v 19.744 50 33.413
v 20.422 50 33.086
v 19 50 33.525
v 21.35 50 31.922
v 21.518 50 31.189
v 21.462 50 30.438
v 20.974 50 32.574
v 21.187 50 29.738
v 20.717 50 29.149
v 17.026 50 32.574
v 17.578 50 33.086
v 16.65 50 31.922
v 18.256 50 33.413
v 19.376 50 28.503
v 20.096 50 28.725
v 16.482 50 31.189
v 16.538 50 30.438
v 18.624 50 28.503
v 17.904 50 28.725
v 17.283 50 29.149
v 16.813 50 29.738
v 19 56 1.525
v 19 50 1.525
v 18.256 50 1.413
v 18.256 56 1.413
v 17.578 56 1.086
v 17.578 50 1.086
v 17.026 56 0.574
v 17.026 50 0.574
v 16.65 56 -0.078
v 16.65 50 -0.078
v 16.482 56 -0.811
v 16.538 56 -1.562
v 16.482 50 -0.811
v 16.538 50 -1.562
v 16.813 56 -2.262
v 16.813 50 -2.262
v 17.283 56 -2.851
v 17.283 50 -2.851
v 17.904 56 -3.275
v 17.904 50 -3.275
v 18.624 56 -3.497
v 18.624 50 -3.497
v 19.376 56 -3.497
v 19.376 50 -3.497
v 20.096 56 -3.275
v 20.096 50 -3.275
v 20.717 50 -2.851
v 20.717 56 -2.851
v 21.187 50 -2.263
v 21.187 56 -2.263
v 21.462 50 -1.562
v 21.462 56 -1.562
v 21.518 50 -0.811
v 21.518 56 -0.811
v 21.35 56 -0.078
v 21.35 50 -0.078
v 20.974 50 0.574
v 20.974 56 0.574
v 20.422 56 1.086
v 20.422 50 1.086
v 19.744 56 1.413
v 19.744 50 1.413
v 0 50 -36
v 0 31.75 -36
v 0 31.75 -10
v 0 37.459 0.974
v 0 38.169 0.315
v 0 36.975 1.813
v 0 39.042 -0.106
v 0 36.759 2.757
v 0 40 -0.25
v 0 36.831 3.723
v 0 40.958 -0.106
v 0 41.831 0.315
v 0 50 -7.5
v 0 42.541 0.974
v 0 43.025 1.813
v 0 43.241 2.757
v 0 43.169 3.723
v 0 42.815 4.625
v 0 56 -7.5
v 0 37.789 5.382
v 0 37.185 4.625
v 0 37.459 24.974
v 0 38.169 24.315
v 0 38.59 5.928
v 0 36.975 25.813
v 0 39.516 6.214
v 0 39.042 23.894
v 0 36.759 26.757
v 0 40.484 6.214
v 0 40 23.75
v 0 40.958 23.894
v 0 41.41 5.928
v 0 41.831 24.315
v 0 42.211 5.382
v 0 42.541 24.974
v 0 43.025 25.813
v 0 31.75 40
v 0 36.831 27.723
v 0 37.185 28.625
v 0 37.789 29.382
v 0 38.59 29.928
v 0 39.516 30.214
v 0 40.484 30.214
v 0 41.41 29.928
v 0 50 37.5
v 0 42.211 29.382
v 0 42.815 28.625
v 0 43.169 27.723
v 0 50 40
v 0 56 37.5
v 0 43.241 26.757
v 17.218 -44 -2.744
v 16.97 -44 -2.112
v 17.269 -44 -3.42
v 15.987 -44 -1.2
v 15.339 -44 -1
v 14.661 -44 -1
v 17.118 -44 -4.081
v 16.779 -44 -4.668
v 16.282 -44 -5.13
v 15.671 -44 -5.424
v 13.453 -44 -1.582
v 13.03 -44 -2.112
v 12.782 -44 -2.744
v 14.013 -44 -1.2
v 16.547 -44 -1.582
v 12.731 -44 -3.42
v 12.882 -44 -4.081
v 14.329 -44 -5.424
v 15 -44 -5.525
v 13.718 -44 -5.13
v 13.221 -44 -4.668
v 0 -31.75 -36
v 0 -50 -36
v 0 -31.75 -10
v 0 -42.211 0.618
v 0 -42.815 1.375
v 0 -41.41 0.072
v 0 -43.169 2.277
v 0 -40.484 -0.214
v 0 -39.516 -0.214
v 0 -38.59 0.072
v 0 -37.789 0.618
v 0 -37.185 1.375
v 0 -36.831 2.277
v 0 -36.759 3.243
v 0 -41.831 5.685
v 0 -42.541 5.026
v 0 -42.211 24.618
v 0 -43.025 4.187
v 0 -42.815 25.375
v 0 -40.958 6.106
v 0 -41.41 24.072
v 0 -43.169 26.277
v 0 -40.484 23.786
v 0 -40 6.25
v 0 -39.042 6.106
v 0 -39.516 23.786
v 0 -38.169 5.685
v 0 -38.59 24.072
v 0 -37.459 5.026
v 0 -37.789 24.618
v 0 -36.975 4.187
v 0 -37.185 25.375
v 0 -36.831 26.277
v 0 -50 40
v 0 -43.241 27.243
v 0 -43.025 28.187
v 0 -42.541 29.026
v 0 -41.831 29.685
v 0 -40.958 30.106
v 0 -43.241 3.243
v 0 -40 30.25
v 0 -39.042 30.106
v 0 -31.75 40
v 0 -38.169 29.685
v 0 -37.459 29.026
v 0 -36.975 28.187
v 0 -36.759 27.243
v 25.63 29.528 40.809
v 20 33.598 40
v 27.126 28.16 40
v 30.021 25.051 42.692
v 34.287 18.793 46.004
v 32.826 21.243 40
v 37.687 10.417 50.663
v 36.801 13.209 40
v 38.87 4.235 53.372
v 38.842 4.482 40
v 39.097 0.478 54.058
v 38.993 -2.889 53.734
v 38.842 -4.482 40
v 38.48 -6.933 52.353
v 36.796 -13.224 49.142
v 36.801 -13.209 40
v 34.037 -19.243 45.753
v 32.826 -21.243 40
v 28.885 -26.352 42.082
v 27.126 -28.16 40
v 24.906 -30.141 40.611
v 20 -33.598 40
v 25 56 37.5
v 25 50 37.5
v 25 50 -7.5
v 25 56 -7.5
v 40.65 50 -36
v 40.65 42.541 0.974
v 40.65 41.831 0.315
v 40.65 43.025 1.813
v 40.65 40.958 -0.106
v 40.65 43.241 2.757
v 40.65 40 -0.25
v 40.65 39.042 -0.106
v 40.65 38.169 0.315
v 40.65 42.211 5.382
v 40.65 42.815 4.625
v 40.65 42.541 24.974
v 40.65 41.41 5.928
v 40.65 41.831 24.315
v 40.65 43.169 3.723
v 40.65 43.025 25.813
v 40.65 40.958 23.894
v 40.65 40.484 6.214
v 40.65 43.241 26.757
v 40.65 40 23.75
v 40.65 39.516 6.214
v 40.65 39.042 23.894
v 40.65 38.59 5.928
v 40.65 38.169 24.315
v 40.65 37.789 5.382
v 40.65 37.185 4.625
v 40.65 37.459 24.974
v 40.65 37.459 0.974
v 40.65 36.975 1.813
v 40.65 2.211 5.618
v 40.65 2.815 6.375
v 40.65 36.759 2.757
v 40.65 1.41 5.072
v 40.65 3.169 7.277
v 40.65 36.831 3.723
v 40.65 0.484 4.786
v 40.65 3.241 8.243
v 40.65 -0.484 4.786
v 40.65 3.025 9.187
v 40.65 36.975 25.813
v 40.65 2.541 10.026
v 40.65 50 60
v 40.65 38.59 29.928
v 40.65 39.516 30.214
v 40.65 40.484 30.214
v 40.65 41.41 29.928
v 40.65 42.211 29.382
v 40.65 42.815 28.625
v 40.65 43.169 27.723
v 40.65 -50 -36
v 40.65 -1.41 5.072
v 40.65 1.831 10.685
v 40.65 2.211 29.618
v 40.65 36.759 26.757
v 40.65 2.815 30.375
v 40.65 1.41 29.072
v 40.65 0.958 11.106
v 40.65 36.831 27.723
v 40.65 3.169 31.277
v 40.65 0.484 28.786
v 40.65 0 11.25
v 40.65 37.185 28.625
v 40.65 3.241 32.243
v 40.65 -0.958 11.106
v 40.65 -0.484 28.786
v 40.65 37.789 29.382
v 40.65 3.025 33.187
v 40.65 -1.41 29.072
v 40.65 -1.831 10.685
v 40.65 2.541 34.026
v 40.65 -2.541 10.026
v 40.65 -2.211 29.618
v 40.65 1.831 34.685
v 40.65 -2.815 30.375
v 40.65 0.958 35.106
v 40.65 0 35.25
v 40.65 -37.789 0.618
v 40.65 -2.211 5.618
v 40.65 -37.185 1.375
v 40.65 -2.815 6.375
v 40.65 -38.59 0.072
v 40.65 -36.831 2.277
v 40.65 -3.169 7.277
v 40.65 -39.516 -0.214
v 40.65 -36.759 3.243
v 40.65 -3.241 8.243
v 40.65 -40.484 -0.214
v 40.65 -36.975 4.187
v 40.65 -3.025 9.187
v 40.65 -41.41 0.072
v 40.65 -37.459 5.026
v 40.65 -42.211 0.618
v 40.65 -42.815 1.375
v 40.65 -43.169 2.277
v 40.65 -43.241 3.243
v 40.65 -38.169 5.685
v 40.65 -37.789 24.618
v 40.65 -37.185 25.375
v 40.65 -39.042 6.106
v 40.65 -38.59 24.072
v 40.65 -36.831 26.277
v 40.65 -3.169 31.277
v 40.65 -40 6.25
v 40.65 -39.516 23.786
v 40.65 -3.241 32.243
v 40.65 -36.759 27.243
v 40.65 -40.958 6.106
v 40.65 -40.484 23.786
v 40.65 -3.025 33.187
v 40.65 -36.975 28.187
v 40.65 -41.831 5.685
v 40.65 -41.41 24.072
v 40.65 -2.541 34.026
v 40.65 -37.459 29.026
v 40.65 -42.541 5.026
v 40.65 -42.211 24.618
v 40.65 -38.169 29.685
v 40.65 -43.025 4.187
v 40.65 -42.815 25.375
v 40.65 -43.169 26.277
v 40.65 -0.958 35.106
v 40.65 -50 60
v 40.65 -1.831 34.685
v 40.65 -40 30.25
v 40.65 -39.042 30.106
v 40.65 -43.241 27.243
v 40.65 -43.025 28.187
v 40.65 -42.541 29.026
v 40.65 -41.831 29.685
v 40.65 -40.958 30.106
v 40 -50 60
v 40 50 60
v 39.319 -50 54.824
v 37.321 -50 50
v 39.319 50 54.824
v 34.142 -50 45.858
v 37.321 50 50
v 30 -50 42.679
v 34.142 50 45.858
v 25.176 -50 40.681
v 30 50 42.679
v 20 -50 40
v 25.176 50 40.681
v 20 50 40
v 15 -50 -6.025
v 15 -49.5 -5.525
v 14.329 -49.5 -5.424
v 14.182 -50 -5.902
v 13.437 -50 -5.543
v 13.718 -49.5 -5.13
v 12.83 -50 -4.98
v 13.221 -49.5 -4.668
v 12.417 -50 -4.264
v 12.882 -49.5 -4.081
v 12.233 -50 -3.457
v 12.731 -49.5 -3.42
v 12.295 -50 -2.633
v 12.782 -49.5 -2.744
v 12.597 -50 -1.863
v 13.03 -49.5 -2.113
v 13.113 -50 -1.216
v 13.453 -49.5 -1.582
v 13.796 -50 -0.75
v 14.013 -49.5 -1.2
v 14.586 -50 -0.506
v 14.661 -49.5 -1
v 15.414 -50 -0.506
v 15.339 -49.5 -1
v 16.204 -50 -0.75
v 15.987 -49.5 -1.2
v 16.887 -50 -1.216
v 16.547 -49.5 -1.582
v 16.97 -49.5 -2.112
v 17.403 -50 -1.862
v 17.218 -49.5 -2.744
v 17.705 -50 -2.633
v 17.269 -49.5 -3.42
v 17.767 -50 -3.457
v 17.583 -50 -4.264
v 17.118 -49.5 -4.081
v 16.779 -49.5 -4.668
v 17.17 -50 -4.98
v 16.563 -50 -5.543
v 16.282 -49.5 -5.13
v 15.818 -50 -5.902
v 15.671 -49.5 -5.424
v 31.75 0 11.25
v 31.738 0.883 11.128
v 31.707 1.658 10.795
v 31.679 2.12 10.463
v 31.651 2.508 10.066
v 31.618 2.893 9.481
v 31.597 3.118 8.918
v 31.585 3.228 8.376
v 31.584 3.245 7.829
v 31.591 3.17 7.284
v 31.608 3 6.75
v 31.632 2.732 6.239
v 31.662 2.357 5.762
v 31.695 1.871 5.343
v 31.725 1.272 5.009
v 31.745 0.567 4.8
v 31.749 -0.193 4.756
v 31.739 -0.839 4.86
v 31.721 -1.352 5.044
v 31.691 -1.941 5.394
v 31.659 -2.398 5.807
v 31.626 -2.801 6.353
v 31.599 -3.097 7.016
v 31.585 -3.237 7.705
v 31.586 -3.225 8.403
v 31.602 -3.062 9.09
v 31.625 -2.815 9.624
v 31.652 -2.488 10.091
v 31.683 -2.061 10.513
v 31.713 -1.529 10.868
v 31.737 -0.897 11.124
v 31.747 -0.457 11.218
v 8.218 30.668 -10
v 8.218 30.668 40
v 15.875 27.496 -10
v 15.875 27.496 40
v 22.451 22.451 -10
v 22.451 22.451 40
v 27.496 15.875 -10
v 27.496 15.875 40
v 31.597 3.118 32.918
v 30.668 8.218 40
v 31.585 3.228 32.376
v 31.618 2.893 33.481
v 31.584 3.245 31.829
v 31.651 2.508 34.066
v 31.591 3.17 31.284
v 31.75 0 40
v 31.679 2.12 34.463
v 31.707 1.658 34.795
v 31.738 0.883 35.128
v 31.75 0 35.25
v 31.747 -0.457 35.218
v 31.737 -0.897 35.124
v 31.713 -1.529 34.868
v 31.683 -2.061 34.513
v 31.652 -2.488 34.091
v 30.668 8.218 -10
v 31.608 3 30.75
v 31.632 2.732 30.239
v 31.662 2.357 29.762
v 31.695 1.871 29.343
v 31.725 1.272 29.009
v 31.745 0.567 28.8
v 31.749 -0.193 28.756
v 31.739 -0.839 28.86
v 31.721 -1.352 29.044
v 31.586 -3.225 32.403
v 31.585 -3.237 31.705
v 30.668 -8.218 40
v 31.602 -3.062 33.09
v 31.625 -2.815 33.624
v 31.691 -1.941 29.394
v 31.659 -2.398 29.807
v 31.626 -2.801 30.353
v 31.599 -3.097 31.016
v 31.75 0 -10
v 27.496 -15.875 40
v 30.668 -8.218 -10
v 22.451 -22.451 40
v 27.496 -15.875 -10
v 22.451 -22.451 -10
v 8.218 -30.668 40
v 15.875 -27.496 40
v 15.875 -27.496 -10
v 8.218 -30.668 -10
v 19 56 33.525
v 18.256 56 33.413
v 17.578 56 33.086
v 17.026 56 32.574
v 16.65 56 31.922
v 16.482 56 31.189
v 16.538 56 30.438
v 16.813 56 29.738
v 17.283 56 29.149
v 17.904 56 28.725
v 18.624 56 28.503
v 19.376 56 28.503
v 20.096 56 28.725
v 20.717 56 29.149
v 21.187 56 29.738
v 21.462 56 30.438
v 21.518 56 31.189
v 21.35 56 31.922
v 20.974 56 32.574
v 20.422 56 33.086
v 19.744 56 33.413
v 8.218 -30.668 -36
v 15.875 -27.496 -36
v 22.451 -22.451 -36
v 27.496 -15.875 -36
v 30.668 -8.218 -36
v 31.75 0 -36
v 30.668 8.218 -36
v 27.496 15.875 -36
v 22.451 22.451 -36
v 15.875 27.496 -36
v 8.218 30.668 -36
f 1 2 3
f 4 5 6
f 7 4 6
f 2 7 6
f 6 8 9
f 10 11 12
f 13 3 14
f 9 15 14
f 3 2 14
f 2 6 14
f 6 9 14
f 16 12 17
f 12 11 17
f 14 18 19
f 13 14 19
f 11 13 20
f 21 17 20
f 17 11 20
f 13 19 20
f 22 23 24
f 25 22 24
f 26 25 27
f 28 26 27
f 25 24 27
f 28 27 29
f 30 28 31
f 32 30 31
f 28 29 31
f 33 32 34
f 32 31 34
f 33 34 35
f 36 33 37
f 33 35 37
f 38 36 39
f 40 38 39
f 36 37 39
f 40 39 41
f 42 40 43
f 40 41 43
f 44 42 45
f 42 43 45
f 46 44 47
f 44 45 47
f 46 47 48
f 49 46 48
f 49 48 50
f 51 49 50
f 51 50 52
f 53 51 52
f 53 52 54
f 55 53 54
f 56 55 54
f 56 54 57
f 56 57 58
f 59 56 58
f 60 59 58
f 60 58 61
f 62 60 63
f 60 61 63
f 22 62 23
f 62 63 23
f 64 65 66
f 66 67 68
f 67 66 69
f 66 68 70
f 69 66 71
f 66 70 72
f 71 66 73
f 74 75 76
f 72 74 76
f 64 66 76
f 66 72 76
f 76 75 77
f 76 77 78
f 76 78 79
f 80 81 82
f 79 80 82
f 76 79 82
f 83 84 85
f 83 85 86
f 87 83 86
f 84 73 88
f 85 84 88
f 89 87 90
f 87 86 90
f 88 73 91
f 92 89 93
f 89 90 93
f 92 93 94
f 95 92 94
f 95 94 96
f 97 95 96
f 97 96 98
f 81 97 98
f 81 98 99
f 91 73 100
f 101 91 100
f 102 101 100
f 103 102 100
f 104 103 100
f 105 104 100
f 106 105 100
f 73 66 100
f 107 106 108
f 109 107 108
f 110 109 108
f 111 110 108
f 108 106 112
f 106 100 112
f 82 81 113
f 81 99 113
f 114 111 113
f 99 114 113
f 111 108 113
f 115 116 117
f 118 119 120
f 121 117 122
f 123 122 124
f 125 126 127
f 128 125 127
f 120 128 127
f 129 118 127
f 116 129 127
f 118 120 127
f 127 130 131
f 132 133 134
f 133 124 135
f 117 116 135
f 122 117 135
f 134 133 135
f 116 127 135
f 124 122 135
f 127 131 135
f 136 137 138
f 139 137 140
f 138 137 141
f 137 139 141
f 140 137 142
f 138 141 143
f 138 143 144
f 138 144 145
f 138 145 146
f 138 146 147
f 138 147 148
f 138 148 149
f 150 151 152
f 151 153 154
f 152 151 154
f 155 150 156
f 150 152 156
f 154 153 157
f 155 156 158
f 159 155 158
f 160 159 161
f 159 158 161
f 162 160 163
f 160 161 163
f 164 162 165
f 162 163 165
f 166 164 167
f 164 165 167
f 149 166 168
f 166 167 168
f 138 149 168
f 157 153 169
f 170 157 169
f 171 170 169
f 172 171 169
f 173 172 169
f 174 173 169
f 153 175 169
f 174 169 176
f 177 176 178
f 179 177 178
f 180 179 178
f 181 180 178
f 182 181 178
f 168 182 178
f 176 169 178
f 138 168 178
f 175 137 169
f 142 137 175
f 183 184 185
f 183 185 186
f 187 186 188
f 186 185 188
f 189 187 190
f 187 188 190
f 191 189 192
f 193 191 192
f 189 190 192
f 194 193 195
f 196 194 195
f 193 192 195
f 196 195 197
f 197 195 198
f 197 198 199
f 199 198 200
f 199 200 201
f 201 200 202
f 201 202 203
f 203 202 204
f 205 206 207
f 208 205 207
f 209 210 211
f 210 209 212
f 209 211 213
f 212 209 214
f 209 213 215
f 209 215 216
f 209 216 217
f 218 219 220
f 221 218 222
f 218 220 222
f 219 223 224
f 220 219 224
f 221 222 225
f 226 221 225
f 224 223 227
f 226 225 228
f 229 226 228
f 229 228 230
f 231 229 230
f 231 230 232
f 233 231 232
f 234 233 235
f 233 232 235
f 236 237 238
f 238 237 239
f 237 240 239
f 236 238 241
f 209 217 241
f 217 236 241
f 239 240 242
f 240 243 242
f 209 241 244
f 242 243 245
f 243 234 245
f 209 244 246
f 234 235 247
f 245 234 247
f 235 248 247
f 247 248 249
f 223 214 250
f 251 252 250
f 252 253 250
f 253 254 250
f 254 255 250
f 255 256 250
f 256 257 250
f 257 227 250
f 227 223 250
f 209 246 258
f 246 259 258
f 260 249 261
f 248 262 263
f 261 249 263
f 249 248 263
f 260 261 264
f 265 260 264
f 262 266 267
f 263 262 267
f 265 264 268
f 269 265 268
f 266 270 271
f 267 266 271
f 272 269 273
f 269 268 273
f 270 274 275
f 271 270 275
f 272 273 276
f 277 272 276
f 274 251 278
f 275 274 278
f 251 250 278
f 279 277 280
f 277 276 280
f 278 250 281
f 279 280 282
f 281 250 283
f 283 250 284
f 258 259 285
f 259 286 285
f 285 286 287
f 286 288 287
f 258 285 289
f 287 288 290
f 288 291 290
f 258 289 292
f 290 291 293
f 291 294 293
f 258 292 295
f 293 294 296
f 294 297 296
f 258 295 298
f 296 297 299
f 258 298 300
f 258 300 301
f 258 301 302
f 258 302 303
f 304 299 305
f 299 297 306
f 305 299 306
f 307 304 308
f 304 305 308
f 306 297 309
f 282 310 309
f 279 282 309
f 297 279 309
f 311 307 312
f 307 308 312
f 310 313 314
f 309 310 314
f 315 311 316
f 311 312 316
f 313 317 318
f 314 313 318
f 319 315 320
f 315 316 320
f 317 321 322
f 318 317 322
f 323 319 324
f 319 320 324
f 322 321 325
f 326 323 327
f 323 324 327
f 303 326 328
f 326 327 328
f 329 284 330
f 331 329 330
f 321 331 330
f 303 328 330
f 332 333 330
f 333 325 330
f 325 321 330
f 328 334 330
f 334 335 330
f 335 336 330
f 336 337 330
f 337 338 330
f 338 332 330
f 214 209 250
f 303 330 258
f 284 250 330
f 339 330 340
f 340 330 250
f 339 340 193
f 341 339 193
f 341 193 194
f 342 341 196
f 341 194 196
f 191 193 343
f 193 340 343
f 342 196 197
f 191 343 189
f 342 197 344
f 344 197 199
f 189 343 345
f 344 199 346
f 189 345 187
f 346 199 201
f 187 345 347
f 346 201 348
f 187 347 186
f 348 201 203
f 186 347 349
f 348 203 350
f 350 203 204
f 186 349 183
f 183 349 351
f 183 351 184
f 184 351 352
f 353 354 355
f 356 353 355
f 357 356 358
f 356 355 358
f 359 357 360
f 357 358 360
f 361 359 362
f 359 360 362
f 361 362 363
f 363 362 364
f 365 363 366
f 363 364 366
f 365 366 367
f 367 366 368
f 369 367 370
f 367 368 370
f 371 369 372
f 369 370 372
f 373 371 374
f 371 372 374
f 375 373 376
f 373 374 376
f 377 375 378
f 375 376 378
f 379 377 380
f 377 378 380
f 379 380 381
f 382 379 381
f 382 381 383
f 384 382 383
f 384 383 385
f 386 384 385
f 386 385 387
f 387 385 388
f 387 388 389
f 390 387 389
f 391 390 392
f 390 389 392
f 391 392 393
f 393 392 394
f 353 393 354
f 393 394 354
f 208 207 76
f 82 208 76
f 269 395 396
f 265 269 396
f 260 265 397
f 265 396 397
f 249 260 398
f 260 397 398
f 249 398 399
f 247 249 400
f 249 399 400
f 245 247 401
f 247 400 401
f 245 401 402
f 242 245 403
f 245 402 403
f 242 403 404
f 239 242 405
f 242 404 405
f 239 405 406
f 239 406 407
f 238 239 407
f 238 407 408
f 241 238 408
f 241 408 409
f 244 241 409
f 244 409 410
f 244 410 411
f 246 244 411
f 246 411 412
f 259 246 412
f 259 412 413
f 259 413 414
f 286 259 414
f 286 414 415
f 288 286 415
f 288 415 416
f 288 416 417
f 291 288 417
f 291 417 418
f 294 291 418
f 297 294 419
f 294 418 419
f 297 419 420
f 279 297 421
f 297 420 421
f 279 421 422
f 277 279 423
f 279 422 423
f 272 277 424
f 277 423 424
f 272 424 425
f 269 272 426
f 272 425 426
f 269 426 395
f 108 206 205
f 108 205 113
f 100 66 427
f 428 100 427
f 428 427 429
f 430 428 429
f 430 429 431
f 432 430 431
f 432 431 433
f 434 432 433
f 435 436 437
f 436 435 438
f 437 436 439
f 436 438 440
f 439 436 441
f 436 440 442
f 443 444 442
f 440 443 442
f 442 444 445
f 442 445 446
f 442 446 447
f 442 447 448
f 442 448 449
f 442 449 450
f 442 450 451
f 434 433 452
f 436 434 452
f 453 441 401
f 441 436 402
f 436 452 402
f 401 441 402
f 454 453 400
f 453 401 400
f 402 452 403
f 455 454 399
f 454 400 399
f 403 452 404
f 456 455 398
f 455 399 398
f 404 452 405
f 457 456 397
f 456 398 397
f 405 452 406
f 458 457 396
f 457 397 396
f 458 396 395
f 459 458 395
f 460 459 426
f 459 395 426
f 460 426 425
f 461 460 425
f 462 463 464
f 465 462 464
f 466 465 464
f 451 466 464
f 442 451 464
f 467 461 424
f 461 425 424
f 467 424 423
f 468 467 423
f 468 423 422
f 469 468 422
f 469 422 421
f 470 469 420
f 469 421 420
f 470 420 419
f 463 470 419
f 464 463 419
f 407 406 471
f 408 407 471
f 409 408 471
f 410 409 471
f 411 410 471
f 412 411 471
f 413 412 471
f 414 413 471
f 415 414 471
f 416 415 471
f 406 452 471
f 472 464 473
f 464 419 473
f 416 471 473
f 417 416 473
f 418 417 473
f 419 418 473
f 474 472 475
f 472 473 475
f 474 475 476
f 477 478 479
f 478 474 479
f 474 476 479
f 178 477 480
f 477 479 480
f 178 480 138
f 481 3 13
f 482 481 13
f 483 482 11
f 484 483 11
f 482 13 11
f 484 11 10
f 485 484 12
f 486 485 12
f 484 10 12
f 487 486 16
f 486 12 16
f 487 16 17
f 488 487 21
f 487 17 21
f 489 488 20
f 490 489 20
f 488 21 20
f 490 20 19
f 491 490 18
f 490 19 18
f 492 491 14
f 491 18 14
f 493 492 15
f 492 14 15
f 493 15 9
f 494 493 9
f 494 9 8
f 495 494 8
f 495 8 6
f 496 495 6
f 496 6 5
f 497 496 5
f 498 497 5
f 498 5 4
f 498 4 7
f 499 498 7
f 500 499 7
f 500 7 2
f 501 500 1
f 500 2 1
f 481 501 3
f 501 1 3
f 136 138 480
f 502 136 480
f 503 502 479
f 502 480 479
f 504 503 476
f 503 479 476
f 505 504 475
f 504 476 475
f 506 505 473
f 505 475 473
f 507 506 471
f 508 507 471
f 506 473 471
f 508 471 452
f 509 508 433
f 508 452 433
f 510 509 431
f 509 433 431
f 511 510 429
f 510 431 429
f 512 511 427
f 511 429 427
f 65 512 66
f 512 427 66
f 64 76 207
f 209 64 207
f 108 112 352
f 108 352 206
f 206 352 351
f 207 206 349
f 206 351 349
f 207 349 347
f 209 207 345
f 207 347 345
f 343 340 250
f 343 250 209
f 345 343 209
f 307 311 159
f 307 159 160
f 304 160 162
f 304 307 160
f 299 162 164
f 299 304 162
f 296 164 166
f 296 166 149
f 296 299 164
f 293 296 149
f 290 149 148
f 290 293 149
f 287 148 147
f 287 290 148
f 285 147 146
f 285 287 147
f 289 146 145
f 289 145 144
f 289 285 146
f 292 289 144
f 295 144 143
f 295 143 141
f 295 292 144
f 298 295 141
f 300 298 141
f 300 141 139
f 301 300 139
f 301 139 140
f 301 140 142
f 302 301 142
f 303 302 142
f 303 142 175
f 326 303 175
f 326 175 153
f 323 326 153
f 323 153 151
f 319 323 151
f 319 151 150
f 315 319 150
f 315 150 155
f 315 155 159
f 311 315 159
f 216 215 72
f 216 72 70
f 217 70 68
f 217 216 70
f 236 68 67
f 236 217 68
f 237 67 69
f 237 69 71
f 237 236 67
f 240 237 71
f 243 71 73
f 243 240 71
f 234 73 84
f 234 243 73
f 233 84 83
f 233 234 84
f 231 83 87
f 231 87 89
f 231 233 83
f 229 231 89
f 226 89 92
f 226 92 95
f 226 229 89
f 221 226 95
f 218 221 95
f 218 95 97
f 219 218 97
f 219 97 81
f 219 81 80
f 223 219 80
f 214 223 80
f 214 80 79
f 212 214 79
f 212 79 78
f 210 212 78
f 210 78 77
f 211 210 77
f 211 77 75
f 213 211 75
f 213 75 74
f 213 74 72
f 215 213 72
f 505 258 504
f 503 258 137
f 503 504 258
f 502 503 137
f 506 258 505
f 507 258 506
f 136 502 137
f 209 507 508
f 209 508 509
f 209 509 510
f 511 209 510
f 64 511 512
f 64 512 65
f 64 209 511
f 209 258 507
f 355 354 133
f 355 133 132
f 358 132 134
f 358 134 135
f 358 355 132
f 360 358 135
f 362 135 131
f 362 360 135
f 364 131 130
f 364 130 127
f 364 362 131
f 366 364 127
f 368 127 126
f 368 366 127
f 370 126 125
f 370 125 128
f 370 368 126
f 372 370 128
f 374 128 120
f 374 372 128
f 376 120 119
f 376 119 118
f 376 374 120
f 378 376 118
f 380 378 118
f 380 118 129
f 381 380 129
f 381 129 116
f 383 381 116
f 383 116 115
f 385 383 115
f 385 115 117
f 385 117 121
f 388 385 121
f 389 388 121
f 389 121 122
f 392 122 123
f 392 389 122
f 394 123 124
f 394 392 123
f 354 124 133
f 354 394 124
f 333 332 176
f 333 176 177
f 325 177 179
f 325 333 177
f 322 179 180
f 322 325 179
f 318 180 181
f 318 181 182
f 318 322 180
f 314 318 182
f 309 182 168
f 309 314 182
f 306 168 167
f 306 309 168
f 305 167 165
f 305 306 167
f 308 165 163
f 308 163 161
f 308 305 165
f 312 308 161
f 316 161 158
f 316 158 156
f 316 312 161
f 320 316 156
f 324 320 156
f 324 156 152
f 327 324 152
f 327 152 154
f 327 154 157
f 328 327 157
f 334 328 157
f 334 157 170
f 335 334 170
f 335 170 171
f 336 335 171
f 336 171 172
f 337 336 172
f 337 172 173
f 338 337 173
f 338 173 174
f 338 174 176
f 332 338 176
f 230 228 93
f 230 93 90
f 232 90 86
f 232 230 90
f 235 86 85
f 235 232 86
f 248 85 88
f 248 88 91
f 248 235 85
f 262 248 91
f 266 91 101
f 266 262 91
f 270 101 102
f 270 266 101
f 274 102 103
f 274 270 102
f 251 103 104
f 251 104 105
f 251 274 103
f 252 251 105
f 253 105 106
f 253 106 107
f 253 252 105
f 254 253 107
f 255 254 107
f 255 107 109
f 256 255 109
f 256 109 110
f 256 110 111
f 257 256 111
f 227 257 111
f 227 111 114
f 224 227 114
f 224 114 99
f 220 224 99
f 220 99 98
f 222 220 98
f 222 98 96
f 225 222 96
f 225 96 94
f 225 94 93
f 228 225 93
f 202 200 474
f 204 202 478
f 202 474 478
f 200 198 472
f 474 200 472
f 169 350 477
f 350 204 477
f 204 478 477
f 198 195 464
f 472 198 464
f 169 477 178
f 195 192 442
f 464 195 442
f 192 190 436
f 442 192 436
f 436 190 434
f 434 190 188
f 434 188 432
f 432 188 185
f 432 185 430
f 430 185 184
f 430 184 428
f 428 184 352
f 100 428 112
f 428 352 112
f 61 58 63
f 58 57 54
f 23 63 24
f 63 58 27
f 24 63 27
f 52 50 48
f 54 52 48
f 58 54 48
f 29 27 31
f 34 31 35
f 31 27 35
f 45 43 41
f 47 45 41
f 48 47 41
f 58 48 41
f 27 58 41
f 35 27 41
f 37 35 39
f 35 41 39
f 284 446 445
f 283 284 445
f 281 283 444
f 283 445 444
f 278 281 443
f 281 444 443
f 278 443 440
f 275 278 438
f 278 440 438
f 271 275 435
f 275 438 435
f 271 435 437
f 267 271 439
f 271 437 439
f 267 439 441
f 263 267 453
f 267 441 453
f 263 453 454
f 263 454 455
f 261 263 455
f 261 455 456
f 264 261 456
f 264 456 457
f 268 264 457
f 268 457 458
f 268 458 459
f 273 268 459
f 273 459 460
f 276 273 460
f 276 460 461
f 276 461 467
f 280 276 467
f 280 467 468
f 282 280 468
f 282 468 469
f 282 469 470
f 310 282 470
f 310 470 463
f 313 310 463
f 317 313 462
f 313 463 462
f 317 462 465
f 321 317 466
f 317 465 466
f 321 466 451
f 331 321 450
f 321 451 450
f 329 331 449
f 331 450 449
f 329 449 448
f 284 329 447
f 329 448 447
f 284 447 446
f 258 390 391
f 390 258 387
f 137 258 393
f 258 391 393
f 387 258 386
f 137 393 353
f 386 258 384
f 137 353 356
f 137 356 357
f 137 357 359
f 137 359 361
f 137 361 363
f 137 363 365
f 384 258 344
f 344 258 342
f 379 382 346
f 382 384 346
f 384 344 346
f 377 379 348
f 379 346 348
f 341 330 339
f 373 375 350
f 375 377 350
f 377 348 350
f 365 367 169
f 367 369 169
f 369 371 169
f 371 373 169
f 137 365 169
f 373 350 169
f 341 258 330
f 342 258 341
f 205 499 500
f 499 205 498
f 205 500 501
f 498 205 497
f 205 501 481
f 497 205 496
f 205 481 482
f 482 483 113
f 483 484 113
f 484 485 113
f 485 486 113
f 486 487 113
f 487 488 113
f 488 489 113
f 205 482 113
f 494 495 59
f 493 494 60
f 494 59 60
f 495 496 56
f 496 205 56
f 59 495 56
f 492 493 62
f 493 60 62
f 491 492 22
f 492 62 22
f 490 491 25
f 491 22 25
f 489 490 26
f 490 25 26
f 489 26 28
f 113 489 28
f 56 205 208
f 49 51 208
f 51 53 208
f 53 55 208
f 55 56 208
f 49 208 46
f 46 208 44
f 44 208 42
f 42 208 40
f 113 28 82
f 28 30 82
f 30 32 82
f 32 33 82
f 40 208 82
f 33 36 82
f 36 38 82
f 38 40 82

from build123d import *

# Parameters (mm, degrees)
CENTRE_HOLE_FOR_L2_DEPTH      = 40
CENTRE_HOLE_FOR_L2_DEPTH_BACK = 10
SKETCH1_R                     = 39.1
SKETCH1_R_2                   = 31.75
MAIN_STRUCTURE_DEPTH          = 60
MAIN_STRUCTURE_DEPTH_BACK     = 50
SKETCH2_W                     = 100
SKETCH2_H                     = 100
SKETCH2_R                     = 39.1
BEARING_CURVE_DEPTH           = 10
SKETCH6_R                     = 10.5
SHAFT_HOLE_DEPTH              = 10
WRIST_CUTOUT_DEPTH            = 188.082869339
SKETCH11_W                    = 25
SKETCH11_H                    = 45
SKETCH11_R                    = 2.525
BOSS_EXTRUDE1_DEPTH           = 6
CUT_EXTRUDE6_DEPTH            = 168.73789077
CUT_EXTRUDE6_DEPTH_BACK       = 168.73789077
SKETCH18_R                    = 3.25
CUT_EXTRUDE7_START            = -1.5875
CUT_EXTRUDE7_DEPTH            = 1.5875
SKETCH9_R                     = 12.05
BEARING_DEPTH                 = 5
CUT_EXTRUDE8_DEPTH            = 3
SKETCH21_R                    = 3.25
SKETCH21_R_2                  = 1.65
CUT_EXTRUDE9_DEPTH            = 167.868211501
CUT_EXTRUDE10_DEPTH           = 6.35
SKETCH23_R                    = 2.275
CUT_EXTRUDE11_DEPTH           = 6
CHAMFER1_SIZE                 = 0.5
BOSS_EXTRUDE2_DEPTH           = 26


with BuildPart() as part:
    # Sketch1 → Centre Hole for L2 (new, two sides: drawn at the far end of the back side and taken through both)
    with BuildSketch(Plane.XY.offset(-CENTRE_HOLE_FOR_L2_DEPTH_BACK)):
        Circle(SKETCH1_R)
        Circle(SKETCH1_R_2, mode=Mode.SUBTRACT)
    extrude(amount=CENTRE_HOLE_FOR_L2_DEPTH + CENTRE_HOLE_FOR_L2_DEPTH_BACK)

    # Sketch2 → Main Structure (add, two sides: drawn at the far end of the back side and taken through both)
    with BuildSketch(Plane.XY.offset(40).offset(-MAIN_STRUCTURE_DEPTH_BACK)):
        Rectangle(SKETCH2_W, SKETCH2_H)
        Circle(SKETCH2_R, mode=Mode.SUBTRACT)
    extrude(amount=MAIN_STRUCTURE_DEPTH + MAIN_STRUCTURE_DEPTH_BACK)

    # Sketch3 → Bearing Curve (add)
    with BuildSketch(Plane.ZY.offset(50)):
        with BuildLine():
            Line((100, 50), (100, -50))
            ThreePointArc((100, -50), (150, 0), (100, 50))
        make_face()
    bearing_curve = extrude(amount=-BEARING_CURVE_DEPTH)

    # Upright Mirror: Bearing Curve across plane
    add(bearing_curve.mirror(Plane(origin=(0, 0, 0), x_dir=(0, 0, 1), z_dir=(1, 0, 0))))

    # Sketch6 → Shaft Hole (cut)
    with BuildSketch(Plane.ZY.offset(50)):
        with Locations((100, 0)):
            Circle(SKETCH6_R)
    extrude(amount=-SHAFT_HOLE_DEPTH, mode=Mode.SUBTRACT)

    # Sketch4 → Wrist Cutout (cut, through all)
    with BuildSketch(Plane(origin=(0, 50, 0), x_dir=(1, 0, 0), z_dir=(0, 1, 0))):
        with BuildLine():
            Line((-40, -100), (-40, -60))
            ThreePointArc((-40, -60), (-34.142135624, -45.857864376), (-20, -40))
            Line((-20, -40), (20, -40))
            ThreePointArc((20, -40), (34.142135624, -45.857864376), (40, -60))
            Line((40, -60), (40, -100))
            Line((40, -100), (-40, -100))
        make_face()
    extrude(amount=-WRIST_CUTOUT_DEPTH, mode=Mode.SUBTRACT)

    # SurfaceCut1
    split(bisect_by=Plane.ZY, keep=Keep.TOP)

    # Sketch11 → Boss-Extrude1 (add)
    with BuildSketch(Plane(origin=(0, 50, 0), x_dir=(1, 0, 0), z_dir=(0, 1, 0))):
        with Locations((-12.5, -15)):
            Rectangle(SKETCH11_W, SKETCH11_H)
        with Locations(Location((-19, 1, 0), (0, 0, 270))):
            Circle(SKETCH11_R, mode=Mode.SUBTRACT)
        with Locations(Location((-19, -31, 0), (0, 0, 270))):
            Circle(SKETCH11_R, mode=Mode.SUBTRACT)
    extrude(amount=BOSS_EXTRUDE1_DEPTH)

    # Sketch18 → Cut-Extrude6 (cut, two sides: drawn at the far end of the back side and taken through both)
    with BuildSketch(Plane.ZY.offset(50).offset(-CUT_EXTRUDE6_DEPTH_BACK)):
        with Locations((8, 0)):
            Circle(SKETCH18_R)
        with Locations((32, 0)):
            Circle(SKETCH18_R)
    extrude(amount=CUT_EXTRUDE6_DEPTH + CUT_EXTRUDE6_DEPTH_BACK, mode=Mode.SUBTRACT)

    # Sketch19 → Cut-Extrude7 (cut)
    with BuildSketch(Plane(origin=(-40, 0, 0), x_dir=(0, 0, -1), z_dir=(1, 0, 0)).offset(CUT_EXTRUDE7_START)):
        with BuildLine():
            Line((-60, 50), (-100, 50))
            ThreePointArc((-100, 50), (-150, 0), (-100, -50))
            Line((-100, -50), (-60, -50))
            Line((-60, -50), (-60, 50))
        make_face()
    extrude(amount=CUT_EXTRUDE7_DEPTH, mode=Mode.SUBTRACT)

    # Sketch9 → Bearing (cut)
    with BuildSketch(Plane(origin=(-41.5875, 0, 0), x_dir=(0, 0, -1), z_dir=(1, 0, 0))):
        with Locations((-100, 0)):
            Circle(SKETCH9_R)
    extrude(amount=-BEARING_DEPTH, mode=Mode.SUBTRACT)

    # Sketch20 → Cut-Extrude8 (cut)
    with BuildSketch(Plane.ZY.offset(50)):
        with BuildLine():
            Line((-10, -50), (100, -50))
            ThreePointArc((100, -50), (150, 0), (100, 50))
            Line((100, 50), (-10, 50))
            Line((-10, 50), (-10, -50))
        make_face()
    extrude(amount=-CUT_EXTRUDE8_DEPTH, mode=Mode.SUBTRACT)

    # Sketch21 → Cut-Extrude9 (cut, through all)
    with BuildSketch(Plane.ZY.offset(47)):
        with Locations((3, -40)):
            Circle(SKETCH21_R)
        with Locations((27, -40)):
            Circle(SKETCH21_R)
        with Locations(Location((27, 40, 0), (0, 0, 180))):
            Circle(SKETCH21_R)
        with Locations(Location((3, 40, 0), (0, 0, 180))):
            Circle(SKETCH21_R)
        with Locations((125, 0)):
            Circle(SKETCH21_R_2)
    extrude(amount=-CUT_EXTRUDE9_DEPTH, mode=Mode.SUBTRACT)

    # Sketch22 → Cut-Extrude10 (cut)
    with BuildSketch(Plane.ZY.offset(47)):
        with BuildLine():
            Line((-10, 50), (-10, -50))
            Line((-10, -50), (100, -50))
            ThreePointArc((100, -50), (150, 0), (100, 50))
            Line((100, 50), (-10, 50))
        make_face()
    extrude(amount=-CUT_EXTRUDE10_DEPTH, mode=Mode.SUBTRACT)

    # Sketch23 → Cut-Extrude11 (cut)
    with BuildSketch(Plane(origin=(0, -50, 0), x_dir=(-1, 0, 0), z_dir=(0, -1, 0))):
        with Locations(Location((15, 3.25, 0), (0, 0, 90))):
            Circle(SKETCH23_R)
    extrude(amount=-CUT_EXTRUDE11_DEPTH, mode=Mode.SUBTRACT)

    # Chamfer1
    chamfer1_edges = [part.edges().sort_by_distance(p)[0] for p in [
        (-15, -50, -0.975),
    ]]
    chamfer(chamfer1_edges, length=CHAMFER1_SIZE)


with BuildPart() as body_2:
    # Mirror1: mirrored copy
    add(part.part.mirror(Plane.ZY))

    # Sketch24 → Boss-Extrude2 (add)
    with BuildSketch(Plane(origin=(0, 0, -10), x_dir=(-1, 0, 0), z_dir=(0, 0, -1))):
        with BuildLine():
            Line((-40.65, 50), (-40.65, -50))
            Line((-40.65, -50), (0, -50))
            Line((0, -50), (0, -31.75))
            ThreePointArc((0, -31.75), (-31.75, 0), (0, 31.75))
            Line((0, 31.75), (0, 50))
            Line((0, 50), (-40.65, 50))
        make_face()
    extrude(amount=BOSS_EXTRUDE2_DEPTH)


solid = body_2.part
